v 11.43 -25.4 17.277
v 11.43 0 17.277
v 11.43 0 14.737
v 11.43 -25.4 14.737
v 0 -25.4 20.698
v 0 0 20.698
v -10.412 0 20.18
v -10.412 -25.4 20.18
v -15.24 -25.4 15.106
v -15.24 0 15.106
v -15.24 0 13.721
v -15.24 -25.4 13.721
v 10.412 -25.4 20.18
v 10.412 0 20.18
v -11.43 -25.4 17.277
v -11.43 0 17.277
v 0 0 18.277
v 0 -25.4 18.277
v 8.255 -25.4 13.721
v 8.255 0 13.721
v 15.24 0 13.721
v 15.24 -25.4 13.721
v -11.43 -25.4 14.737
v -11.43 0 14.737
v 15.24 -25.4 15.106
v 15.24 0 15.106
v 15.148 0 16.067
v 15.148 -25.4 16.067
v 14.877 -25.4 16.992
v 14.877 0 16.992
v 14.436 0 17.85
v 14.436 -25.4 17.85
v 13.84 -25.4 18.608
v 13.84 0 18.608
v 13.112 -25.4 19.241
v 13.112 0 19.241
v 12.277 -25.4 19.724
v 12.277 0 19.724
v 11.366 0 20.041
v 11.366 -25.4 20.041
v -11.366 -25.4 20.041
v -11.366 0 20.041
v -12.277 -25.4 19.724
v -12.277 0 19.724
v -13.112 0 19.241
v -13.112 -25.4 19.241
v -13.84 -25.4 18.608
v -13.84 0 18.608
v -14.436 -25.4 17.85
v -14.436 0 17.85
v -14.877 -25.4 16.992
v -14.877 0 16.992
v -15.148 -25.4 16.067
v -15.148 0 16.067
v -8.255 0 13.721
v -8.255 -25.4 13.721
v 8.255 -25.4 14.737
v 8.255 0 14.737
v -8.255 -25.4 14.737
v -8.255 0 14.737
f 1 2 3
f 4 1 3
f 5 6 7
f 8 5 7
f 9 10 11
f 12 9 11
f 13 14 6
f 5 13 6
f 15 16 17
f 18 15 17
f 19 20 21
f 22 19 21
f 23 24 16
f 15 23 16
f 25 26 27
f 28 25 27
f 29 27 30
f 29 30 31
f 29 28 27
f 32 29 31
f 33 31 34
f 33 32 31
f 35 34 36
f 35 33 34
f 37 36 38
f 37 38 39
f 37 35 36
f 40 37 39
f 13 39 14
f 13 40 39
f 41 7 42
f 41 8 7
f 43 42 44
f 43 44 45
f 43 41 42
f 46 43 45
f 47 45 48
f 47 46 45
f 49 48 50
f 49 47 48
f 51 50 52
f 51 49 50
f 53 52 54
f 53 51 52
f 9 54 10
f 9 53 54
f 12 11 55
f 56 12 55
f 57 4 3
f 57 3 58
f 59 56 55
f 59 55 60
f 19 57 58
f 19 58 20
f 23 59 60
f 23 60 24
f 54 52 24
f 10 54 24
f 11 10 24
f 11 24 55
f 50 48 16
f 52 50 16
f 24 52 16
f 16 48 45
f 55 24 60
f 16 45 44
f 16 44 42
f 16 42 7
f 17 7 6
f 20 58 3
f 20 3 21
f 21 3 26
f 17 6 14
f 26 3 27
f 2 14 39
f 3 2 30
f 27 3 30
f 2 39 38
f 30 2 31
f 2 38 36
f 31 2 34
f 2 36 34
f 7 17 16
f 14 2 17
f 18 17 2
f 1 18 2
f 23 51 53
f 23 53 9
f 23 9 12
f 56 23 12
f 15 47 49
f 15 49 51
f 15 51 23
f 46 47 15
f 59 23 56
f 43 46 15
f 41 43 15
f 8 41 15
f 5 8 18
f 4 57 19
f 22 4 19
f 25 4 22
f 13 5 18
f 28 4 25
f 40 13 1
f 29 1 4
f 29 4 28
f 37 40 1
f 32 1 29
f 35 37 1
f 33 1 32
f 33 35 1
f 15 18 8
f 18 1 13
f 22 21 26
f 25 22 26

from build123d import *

# Parameters (mm, degrees)
F1_DEPTH = 25.4
F2_R     = 5.08


with BuildPart() as f1:
    # F0 (on Front) → F1 (new body)
    with BuildSketch(Plane.XZ):
        Polygon((-11.43, 14.737148), (-11.43, 17.277148), (0, 18.277143), (11.43, 17.277148), (11.43, 14.737148), (8.255, 14.737148), (8.255, 13.721148), (15.24, 13.721148), (15.24, 19.940279), (0, 20.697519), (-15.24, 19.940279), (-15.24, 13.721148), (-8.255, 13.721148), (-8.255, 14.737148), align=None)
    extrude(amount=F1_DEPTH)

    # F2
    f2_edges = [f1.edges().sort_by_distance(p)[0] for p in [
        (15.24, -12.7, 19.940279),
        (-15.24, -12.7, 19.940279),
    ]]
    fillet(f2_edges, radius=F2_R)


solid = f1.part
